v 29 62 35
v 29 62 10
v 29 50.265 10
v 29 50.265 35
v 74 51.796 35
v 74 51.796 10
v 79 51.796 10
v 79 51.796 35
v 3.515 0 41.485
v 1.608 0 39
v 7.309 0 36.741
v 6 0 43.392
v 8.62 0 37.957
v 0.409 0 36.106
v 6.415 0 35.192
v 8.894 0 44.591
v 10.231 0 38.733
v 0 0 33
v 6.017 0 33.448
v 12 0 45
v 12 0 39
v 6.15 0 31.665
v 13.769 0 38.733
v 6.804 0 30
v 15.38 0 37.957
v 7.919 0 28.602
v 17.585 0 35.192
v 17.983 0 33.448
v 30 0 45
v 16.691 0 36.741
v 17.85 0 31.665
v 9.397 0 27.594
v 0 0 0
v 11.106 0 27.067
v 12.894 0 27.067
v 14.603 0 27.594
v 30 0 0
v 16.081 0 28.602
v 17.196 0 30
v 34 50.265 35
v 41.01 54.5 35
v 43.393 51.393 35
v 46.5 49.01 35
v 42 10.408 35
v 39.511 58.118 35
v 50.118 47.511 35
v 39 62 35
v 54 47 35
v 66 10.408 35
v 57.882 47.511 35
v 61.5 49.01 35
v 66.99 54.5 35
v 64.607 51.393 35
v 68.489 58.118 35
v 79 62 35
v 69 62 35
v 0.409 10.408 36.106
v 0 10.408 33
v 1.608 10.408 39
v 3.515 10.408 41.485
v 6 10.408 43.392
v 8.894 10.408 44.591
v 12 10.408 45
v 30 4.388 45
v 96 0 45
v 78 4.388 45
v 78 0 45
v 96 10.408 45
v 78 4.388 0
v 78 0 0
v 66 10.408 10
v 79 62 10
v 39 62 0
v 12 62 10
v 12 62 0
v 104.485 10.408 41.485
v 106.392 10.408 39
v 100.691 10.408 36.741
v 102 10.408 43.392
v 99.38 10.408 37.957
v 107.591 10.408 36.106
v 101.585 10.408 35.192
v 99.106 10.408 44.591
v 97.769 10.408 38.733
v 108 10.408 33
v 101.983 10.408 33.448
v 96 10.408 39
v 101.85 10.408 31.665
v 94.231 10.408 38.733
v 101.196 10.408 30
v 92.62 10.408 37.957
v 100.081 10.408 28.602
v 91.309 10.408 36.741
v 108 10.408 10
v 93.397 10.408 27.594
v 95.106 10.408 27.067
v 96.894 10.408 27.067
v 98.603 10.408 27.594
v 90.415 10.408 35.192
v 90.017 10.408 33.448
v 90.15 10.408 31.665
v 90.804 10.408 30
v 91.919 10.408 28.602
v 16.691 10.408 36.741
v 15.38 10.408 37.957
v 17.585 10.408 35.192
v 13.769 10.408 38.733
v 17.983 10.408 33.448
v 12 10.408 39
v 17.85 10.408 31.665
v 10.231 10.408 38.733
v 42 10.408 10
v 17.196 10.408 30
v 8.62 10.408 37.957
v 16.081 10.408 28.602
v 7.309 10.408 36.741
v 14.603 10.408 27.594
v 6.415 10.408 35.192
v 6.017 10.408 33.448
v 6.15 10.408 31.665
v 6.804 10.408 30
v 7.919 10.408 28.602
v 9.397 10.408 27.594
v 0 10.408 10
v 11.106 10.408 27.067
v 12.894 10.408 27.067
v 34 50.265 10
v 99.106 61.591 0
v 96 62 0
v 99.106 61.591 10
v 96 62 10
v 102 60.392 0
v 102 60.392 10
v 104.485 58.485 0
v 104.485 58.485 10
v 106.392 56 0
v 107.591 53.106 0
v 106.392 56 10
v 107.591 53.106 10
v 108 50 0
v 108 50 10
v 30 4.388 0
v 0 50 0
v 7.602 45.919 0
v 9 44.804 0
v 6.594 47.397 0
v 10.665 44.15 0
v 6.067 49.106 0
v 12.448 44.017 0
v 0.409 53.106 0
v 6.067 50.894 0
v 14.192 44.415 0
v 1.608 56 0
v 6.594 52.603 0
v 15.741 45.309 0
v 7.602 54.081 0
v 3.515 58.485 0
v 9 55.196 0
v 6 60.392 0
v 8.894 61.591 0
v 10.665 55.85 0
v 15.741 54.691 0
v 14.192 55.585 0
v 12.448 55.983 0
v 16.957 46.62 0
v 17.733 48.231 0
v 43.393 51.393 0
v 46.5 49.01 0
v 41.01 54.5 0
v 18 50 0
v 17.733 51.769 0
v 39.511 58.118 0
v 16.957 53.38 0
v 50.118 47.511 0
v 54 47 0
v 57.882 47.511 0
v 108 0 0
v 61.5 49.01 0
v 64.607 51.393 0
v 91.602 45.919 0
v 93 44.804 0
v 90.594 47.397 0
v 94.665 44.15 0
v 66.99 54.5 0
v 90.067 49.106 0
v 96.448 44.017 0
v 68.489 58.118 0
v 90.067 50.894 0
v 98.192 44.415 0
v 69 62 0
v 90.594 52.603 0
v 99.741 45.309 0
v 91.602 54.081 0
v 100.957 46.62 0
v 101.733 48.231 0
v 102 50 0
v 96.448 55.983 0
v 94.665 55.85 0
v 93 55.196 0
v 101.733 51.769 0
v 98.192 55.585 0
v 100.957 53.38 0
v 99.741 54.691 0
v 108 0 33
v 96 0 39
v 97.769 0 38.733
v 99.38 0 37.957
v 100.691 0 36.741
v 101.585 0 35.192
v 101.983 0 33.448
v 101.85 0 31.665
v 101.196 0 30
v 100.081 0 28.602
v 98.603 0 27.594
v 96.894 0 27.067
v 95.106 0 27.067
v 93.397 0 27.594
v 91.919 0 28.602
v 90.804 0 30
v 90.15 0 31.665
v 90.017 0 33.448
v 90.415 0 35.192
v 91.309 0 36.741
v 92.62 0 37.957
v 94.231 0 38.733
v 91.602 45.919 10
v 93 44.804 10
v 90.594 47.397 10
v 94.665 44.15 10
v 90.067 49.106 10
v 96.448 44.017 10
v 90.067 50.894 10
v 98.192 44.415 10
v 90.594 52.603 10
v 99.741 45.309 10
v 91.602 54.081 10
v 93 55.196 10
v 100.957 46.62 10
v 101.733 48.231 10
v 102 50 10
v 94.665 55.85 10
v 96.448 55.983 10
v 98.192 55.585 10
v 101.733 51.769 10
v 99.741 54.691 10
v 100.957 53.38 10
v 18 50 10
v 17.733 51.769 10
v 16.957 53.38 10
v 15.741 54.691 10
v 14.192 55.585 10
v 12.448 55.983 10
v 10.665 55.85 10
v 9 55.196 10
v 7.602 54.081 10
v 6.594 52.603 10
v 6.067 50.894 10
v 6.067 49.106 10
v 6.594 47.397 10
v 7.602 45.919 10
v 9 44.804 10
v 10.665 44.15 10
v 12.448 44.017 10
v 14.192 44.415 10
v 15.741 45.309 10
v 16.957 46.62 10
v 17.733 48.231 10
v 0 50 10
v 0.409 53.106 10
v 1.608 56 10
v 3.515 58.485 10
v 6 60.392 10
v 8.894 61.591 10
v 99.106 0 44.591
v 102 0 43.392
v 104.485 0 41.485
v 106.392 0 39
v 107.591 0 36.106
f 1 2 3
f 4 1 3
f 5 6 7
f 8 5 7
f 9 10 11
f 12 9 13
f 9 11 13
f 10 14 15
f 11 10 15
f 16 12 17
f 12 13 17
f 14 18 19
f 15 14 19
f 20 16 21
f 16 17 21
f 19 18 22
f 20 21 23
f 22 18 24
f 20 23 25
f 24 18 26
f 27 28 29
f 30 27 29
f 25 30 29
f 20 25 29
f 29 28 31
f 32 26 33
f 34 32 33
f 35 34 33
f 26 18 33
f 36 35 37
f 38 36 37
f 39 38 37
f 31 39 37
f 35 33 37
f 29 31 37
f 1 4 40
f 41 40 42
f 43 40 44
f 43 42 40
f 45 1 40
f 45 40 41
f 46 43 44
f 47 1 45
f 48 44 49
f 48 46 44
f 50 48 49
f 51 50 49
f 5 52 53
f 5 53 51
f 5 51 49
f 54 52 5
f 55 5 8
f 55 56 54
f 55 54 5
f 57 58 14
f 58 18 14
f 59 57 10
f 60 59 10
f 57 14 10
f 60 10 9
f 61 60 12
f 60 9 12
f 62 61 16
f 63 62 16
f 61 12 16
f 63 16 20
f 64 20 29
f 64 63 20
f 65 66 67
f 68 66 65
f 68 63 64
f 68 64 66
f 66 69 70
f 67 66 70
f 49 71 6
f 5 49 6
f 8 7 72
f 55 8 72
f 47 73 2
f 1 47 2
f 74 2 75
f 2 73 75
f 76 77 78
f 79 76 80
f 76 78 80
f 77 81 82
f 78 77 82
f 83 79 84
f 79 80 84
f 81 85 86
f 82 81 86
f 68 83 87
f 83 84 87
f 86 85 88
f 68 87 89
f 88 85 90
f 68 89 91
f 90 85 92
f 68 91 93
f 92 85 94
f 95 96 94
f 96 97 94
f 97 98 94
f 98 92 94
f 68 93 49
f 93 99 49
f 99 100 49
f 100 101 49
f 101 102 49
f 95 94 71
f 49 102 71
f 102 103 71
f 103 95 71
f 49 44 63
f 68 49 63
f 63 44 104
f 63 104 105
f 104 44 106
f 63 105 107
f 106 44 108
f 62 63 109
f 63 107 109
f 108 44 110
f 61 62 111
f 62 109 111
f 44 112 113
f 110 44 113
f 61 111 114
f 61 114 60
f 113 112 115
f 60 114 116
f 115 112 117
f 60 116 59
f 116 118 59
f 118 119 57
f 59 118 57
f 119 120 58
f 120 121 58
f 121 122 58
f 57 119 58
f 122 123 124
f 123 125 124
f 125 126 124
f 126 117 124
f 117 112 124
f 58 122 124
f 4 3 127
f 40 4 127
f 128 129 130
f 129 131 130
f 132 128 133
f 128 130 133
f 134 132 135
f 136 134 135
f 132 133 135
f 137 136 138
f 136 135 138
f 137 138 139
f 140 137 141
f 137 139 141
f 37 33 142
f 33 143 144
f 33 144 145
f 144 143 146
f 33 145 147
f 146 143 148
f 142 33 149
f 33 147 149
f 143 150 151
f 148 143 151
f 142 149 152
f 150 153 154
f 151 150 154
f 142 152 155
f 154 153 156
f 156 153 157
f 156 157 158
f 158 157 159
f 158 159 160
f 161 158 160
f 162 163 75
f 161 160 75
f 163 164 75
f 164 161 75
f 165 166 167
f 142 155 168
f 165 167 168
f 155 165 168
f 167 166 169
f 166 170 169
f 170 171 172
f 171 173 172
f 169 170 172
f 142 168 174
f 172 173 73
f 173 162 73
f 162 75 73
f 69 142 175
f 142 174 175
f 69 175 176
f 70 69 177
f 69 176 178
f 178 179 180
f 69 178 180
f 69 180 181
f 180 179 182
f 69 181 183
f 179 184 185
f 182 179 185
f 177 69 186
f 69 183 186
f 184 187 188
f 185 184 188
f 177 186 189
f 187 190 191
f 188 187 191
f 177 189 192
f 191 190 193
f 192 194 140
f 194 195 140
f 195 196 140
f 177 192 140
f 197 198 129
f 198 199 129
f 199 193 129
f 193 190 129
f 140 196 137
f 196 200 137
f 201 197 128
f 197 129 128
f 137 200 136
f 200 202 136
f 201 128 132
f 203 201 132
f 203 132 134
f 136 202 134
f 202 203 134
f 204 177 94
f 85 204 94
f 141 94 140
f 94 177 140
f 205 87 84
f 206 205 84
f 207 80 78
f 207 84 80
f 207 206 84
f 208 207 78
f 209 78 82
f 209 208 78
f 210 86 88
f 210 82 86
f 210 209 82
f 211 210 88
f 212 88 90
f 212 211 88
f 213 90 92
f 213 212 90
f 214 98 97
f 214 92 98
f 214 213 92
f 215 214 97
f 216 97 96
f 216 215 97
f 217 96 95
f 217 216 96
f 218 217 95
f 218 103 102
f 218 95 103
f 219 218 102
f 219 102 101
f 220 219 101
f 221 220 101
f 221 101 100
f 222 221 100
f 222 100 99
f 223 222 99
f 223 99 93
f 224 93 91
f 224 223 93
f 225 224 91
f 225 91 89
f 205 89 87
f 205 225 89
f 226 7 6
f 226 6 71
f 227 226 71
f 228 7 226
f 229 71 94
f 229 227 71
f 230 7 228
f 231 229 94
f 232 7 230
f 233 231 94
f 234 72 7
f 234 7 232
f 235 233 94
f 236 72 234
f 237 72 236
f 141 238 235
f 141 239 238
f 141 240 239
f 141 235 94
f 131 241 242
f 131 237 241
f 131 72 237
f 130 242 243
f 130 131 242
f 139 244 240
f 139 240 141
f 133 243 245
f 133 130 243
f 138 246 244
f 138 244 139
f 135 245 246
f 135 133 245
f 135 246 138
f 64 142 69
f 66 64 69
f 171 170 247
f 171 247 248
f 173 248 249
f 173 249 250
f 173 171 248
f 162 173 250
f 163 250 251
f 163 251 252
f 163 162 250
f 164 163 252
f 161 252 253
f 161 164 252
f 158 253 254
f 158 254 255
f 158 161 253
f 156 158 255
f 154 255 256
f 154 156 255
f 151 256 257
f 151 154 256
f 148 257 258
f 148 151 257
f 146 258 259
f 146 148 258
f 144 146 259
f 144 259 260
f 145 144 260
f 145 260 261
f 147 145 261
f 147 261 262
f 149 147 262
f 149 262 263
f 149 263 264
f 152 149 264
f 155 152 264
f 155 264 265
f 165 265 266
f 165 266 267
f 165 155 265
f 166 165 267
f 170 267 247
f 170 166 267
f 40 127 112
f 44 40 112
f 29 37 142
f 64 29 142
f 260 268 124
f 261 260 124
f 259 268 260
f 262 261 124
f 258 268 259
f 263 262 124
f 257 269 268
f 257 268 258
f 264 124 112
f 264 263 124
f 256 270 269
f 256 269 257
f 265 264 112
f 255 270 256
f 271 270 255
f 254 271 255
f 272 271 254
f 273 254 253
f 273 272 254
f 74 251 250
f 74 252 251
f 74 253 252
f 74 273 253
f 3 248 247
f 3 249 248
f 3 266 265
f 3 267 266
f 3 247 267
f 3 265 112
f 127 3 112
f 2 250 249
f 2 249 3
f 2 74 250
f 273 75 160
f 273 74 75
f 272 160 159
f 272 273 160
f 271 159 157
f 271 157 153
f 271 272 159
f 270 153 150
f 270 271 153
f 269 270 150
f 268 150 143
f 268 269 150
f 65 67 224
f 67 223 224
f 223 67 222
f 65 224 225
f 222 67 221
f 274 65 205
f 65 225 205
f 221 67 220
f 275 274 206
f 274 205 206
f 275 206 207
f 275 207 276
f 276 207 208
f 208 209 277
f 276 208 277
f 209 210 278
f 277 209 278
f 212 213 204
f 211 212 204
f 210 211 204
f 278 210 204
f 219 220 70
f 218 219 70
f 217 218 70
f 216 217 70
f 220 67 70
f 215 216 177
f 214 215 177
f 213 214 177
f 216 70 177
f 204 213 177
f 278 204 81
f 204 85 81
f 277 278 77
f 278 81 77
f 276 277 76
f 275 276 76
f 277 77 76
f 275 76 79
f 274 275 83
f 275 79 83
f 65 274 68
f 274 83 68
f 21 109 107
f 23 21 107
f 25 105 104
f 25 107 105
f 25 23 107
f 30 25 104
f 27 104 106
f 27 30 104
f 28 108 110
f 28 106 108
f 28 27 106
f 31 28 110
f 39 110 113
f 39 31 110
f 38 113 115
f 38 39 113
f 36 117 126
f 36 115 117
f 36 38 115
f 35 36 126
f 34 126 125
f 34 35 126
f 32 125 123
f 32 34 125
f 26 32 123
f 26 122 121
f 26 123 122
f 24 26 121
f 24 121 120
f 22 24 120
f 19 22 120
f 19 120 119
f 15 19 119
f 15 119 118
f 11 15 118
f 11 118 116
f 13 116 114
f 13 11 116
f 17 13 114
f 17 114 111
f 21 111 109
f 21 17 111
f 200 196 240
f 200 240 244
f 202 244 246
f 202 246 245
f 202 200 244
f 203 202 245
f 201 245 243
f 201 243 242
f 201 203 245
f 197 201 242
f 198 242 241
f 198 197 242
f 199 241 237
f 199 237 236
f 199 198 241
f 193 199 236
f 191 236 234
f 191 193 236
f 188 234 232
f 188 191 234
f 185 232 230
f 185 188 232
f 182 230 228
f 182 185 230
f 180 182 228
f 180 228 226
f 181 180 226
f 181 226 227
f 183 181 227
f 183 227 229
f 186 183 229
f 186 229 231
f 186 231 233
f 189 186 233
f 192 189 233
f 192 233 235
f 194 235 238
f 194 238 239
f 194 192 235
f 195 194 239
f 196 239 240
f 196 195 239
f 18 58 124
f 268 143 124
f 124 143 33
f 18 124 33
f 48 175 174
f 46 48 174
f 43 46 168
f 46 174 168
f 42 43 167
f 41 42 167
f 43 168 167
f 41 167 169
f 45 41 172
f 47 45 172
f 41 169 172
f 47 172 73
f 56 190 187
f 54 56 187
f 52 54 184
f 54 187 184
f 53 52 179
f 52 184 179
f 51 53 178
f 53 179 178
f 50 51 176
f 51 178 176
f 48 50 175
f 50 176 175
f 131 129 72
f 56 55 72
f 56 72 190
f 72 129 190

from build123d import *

# Parameters (mm, degrees)
BOSS_EXTRUDE1_DEPTH     = 45
SKETCH1_3_R             = 6
BOSS_EXTRUDE2_DEPTH     = 10
BOSS_EXTRUDE3_DEPTH     = 35
FILLET1_R               = 12
FILLET2_R               = 12
FILLET3_R               = 12
CUT_EXTRUDE1_DEPTH      = 128.869924602
CUT_EXTRUDE1_DEPTH_BACK = 128.869924602
SKETCH2_R               = 6


with BuildPart() as part:
    # Sketch1 → Boss-Extrude1 (new body)
    with BuildSketch(Plane.XY):
        Polygon((0, 10.408163265), (0, 0), (30, 0), (30, 4.387755102), (78, 4.387755102), (78, 0), (108, 0), (108, 10.408163265), align=None)
    extrude(amount=BOSS_EXTRUDE1_DEPTH)

    # Sketch1<3> → Boss-Extrude2 (add)
    # profile 1 of 2: a face of its own
    with BuildSketch(Plane.XY):
        Polygon((0, 62), (0, 10.408163265), (42, 10.408163265), (34, 50.265306122), (29, 50.265306122), (29, 62), align=None)
        with Locations((12, 50)):
            Circle(SKETCH1_3_R, mode=Mode.SUBTRACT)
    # profile 2 of 2: a face of its own
    with BuildSketch(Plane.XY):
        Polygon((74, 51.795918367), (66, 10.408163265), (108, 10.408163265), (108, 62), (79, 62), (79, 51.795918367), align=None)
        with Locations((96, 50)):
            Circle(SKETCH1_3_R, mode=Mode.SUBTRACT)
    extrude(amount=BOSS_EXTRUDE2_DEPTH)

    # Sketch1<4> → Boss-Extrude3 (add)
    with BuildSketch(Plane.XY):
        with BuildLine():
            Line((34, 50.265306122), (42, 10.408163265))
            Line((42, 10.408163265), (66, 10.408163265))
            Line((66, 10.408163265), (74, 51.795918367))
            Line((74, 51.795918367), (79, 51.795918367))
            Line((79, 51.795918367), (79, 62))
            Line((79, 62), (69, 62))
            ThreePointArc((69, 62), (54, 47), (39, 62))
            Line((39, 62), (29, 62))
            Line((29, 62), (29, 50.265306122))
            Line((29, 50.265306122), (34, 50.265306122))
        make_face()
    extrude(amount=BOSS_EXTRUDE3_DEPTH)

    # Fillet1
    fillet1_edges = [part.edges().sort_by_distance(p)[0] for p in [
        (0, 62, 5),
    ]]
    fillet(fillet1_edges, radius=FILLET1_R)

    # Fillet2
    fillet2_edges = [part.edges().sort_by_distance(p)[0] for p in [
        (108, 62, 5),
    ]]
    fillet(fillet2_edges, radius=FILLET2_R)

    # Fillet3
    fillet3_edges = [part.edges().sort_by_distance(p)[0] for p in [
        (108, 5.204081633, 45),
        (0, 5.204081633, 45),
    ]]
    fillet(fillet3_edges, radius=FILLET3_R)

    # Sketch2 → Cut-Extrude1 (cut, two sides: drawn at the far end of the back side and taken through both)
    with BuildSketch(Plane(origin=(0, 10.408163265, 0), x_dir=(1, 0, 0), z_dir=(0, 1, 0)).offset(-CUT_EXTRUDE1_DEPTH_BACK)):
        with Locations((12, -33)):
            Circle(SKETCH2_R)
        with Locations((96, -33)):
            Circle(SKETCH2_R)
    extrude(amount=CUT_EXTRUDE1_DEPTH + CUT_EXTRUDE1_DEPTH_BACK, mode=Mode.SUBTRACT)


solid = part.part
